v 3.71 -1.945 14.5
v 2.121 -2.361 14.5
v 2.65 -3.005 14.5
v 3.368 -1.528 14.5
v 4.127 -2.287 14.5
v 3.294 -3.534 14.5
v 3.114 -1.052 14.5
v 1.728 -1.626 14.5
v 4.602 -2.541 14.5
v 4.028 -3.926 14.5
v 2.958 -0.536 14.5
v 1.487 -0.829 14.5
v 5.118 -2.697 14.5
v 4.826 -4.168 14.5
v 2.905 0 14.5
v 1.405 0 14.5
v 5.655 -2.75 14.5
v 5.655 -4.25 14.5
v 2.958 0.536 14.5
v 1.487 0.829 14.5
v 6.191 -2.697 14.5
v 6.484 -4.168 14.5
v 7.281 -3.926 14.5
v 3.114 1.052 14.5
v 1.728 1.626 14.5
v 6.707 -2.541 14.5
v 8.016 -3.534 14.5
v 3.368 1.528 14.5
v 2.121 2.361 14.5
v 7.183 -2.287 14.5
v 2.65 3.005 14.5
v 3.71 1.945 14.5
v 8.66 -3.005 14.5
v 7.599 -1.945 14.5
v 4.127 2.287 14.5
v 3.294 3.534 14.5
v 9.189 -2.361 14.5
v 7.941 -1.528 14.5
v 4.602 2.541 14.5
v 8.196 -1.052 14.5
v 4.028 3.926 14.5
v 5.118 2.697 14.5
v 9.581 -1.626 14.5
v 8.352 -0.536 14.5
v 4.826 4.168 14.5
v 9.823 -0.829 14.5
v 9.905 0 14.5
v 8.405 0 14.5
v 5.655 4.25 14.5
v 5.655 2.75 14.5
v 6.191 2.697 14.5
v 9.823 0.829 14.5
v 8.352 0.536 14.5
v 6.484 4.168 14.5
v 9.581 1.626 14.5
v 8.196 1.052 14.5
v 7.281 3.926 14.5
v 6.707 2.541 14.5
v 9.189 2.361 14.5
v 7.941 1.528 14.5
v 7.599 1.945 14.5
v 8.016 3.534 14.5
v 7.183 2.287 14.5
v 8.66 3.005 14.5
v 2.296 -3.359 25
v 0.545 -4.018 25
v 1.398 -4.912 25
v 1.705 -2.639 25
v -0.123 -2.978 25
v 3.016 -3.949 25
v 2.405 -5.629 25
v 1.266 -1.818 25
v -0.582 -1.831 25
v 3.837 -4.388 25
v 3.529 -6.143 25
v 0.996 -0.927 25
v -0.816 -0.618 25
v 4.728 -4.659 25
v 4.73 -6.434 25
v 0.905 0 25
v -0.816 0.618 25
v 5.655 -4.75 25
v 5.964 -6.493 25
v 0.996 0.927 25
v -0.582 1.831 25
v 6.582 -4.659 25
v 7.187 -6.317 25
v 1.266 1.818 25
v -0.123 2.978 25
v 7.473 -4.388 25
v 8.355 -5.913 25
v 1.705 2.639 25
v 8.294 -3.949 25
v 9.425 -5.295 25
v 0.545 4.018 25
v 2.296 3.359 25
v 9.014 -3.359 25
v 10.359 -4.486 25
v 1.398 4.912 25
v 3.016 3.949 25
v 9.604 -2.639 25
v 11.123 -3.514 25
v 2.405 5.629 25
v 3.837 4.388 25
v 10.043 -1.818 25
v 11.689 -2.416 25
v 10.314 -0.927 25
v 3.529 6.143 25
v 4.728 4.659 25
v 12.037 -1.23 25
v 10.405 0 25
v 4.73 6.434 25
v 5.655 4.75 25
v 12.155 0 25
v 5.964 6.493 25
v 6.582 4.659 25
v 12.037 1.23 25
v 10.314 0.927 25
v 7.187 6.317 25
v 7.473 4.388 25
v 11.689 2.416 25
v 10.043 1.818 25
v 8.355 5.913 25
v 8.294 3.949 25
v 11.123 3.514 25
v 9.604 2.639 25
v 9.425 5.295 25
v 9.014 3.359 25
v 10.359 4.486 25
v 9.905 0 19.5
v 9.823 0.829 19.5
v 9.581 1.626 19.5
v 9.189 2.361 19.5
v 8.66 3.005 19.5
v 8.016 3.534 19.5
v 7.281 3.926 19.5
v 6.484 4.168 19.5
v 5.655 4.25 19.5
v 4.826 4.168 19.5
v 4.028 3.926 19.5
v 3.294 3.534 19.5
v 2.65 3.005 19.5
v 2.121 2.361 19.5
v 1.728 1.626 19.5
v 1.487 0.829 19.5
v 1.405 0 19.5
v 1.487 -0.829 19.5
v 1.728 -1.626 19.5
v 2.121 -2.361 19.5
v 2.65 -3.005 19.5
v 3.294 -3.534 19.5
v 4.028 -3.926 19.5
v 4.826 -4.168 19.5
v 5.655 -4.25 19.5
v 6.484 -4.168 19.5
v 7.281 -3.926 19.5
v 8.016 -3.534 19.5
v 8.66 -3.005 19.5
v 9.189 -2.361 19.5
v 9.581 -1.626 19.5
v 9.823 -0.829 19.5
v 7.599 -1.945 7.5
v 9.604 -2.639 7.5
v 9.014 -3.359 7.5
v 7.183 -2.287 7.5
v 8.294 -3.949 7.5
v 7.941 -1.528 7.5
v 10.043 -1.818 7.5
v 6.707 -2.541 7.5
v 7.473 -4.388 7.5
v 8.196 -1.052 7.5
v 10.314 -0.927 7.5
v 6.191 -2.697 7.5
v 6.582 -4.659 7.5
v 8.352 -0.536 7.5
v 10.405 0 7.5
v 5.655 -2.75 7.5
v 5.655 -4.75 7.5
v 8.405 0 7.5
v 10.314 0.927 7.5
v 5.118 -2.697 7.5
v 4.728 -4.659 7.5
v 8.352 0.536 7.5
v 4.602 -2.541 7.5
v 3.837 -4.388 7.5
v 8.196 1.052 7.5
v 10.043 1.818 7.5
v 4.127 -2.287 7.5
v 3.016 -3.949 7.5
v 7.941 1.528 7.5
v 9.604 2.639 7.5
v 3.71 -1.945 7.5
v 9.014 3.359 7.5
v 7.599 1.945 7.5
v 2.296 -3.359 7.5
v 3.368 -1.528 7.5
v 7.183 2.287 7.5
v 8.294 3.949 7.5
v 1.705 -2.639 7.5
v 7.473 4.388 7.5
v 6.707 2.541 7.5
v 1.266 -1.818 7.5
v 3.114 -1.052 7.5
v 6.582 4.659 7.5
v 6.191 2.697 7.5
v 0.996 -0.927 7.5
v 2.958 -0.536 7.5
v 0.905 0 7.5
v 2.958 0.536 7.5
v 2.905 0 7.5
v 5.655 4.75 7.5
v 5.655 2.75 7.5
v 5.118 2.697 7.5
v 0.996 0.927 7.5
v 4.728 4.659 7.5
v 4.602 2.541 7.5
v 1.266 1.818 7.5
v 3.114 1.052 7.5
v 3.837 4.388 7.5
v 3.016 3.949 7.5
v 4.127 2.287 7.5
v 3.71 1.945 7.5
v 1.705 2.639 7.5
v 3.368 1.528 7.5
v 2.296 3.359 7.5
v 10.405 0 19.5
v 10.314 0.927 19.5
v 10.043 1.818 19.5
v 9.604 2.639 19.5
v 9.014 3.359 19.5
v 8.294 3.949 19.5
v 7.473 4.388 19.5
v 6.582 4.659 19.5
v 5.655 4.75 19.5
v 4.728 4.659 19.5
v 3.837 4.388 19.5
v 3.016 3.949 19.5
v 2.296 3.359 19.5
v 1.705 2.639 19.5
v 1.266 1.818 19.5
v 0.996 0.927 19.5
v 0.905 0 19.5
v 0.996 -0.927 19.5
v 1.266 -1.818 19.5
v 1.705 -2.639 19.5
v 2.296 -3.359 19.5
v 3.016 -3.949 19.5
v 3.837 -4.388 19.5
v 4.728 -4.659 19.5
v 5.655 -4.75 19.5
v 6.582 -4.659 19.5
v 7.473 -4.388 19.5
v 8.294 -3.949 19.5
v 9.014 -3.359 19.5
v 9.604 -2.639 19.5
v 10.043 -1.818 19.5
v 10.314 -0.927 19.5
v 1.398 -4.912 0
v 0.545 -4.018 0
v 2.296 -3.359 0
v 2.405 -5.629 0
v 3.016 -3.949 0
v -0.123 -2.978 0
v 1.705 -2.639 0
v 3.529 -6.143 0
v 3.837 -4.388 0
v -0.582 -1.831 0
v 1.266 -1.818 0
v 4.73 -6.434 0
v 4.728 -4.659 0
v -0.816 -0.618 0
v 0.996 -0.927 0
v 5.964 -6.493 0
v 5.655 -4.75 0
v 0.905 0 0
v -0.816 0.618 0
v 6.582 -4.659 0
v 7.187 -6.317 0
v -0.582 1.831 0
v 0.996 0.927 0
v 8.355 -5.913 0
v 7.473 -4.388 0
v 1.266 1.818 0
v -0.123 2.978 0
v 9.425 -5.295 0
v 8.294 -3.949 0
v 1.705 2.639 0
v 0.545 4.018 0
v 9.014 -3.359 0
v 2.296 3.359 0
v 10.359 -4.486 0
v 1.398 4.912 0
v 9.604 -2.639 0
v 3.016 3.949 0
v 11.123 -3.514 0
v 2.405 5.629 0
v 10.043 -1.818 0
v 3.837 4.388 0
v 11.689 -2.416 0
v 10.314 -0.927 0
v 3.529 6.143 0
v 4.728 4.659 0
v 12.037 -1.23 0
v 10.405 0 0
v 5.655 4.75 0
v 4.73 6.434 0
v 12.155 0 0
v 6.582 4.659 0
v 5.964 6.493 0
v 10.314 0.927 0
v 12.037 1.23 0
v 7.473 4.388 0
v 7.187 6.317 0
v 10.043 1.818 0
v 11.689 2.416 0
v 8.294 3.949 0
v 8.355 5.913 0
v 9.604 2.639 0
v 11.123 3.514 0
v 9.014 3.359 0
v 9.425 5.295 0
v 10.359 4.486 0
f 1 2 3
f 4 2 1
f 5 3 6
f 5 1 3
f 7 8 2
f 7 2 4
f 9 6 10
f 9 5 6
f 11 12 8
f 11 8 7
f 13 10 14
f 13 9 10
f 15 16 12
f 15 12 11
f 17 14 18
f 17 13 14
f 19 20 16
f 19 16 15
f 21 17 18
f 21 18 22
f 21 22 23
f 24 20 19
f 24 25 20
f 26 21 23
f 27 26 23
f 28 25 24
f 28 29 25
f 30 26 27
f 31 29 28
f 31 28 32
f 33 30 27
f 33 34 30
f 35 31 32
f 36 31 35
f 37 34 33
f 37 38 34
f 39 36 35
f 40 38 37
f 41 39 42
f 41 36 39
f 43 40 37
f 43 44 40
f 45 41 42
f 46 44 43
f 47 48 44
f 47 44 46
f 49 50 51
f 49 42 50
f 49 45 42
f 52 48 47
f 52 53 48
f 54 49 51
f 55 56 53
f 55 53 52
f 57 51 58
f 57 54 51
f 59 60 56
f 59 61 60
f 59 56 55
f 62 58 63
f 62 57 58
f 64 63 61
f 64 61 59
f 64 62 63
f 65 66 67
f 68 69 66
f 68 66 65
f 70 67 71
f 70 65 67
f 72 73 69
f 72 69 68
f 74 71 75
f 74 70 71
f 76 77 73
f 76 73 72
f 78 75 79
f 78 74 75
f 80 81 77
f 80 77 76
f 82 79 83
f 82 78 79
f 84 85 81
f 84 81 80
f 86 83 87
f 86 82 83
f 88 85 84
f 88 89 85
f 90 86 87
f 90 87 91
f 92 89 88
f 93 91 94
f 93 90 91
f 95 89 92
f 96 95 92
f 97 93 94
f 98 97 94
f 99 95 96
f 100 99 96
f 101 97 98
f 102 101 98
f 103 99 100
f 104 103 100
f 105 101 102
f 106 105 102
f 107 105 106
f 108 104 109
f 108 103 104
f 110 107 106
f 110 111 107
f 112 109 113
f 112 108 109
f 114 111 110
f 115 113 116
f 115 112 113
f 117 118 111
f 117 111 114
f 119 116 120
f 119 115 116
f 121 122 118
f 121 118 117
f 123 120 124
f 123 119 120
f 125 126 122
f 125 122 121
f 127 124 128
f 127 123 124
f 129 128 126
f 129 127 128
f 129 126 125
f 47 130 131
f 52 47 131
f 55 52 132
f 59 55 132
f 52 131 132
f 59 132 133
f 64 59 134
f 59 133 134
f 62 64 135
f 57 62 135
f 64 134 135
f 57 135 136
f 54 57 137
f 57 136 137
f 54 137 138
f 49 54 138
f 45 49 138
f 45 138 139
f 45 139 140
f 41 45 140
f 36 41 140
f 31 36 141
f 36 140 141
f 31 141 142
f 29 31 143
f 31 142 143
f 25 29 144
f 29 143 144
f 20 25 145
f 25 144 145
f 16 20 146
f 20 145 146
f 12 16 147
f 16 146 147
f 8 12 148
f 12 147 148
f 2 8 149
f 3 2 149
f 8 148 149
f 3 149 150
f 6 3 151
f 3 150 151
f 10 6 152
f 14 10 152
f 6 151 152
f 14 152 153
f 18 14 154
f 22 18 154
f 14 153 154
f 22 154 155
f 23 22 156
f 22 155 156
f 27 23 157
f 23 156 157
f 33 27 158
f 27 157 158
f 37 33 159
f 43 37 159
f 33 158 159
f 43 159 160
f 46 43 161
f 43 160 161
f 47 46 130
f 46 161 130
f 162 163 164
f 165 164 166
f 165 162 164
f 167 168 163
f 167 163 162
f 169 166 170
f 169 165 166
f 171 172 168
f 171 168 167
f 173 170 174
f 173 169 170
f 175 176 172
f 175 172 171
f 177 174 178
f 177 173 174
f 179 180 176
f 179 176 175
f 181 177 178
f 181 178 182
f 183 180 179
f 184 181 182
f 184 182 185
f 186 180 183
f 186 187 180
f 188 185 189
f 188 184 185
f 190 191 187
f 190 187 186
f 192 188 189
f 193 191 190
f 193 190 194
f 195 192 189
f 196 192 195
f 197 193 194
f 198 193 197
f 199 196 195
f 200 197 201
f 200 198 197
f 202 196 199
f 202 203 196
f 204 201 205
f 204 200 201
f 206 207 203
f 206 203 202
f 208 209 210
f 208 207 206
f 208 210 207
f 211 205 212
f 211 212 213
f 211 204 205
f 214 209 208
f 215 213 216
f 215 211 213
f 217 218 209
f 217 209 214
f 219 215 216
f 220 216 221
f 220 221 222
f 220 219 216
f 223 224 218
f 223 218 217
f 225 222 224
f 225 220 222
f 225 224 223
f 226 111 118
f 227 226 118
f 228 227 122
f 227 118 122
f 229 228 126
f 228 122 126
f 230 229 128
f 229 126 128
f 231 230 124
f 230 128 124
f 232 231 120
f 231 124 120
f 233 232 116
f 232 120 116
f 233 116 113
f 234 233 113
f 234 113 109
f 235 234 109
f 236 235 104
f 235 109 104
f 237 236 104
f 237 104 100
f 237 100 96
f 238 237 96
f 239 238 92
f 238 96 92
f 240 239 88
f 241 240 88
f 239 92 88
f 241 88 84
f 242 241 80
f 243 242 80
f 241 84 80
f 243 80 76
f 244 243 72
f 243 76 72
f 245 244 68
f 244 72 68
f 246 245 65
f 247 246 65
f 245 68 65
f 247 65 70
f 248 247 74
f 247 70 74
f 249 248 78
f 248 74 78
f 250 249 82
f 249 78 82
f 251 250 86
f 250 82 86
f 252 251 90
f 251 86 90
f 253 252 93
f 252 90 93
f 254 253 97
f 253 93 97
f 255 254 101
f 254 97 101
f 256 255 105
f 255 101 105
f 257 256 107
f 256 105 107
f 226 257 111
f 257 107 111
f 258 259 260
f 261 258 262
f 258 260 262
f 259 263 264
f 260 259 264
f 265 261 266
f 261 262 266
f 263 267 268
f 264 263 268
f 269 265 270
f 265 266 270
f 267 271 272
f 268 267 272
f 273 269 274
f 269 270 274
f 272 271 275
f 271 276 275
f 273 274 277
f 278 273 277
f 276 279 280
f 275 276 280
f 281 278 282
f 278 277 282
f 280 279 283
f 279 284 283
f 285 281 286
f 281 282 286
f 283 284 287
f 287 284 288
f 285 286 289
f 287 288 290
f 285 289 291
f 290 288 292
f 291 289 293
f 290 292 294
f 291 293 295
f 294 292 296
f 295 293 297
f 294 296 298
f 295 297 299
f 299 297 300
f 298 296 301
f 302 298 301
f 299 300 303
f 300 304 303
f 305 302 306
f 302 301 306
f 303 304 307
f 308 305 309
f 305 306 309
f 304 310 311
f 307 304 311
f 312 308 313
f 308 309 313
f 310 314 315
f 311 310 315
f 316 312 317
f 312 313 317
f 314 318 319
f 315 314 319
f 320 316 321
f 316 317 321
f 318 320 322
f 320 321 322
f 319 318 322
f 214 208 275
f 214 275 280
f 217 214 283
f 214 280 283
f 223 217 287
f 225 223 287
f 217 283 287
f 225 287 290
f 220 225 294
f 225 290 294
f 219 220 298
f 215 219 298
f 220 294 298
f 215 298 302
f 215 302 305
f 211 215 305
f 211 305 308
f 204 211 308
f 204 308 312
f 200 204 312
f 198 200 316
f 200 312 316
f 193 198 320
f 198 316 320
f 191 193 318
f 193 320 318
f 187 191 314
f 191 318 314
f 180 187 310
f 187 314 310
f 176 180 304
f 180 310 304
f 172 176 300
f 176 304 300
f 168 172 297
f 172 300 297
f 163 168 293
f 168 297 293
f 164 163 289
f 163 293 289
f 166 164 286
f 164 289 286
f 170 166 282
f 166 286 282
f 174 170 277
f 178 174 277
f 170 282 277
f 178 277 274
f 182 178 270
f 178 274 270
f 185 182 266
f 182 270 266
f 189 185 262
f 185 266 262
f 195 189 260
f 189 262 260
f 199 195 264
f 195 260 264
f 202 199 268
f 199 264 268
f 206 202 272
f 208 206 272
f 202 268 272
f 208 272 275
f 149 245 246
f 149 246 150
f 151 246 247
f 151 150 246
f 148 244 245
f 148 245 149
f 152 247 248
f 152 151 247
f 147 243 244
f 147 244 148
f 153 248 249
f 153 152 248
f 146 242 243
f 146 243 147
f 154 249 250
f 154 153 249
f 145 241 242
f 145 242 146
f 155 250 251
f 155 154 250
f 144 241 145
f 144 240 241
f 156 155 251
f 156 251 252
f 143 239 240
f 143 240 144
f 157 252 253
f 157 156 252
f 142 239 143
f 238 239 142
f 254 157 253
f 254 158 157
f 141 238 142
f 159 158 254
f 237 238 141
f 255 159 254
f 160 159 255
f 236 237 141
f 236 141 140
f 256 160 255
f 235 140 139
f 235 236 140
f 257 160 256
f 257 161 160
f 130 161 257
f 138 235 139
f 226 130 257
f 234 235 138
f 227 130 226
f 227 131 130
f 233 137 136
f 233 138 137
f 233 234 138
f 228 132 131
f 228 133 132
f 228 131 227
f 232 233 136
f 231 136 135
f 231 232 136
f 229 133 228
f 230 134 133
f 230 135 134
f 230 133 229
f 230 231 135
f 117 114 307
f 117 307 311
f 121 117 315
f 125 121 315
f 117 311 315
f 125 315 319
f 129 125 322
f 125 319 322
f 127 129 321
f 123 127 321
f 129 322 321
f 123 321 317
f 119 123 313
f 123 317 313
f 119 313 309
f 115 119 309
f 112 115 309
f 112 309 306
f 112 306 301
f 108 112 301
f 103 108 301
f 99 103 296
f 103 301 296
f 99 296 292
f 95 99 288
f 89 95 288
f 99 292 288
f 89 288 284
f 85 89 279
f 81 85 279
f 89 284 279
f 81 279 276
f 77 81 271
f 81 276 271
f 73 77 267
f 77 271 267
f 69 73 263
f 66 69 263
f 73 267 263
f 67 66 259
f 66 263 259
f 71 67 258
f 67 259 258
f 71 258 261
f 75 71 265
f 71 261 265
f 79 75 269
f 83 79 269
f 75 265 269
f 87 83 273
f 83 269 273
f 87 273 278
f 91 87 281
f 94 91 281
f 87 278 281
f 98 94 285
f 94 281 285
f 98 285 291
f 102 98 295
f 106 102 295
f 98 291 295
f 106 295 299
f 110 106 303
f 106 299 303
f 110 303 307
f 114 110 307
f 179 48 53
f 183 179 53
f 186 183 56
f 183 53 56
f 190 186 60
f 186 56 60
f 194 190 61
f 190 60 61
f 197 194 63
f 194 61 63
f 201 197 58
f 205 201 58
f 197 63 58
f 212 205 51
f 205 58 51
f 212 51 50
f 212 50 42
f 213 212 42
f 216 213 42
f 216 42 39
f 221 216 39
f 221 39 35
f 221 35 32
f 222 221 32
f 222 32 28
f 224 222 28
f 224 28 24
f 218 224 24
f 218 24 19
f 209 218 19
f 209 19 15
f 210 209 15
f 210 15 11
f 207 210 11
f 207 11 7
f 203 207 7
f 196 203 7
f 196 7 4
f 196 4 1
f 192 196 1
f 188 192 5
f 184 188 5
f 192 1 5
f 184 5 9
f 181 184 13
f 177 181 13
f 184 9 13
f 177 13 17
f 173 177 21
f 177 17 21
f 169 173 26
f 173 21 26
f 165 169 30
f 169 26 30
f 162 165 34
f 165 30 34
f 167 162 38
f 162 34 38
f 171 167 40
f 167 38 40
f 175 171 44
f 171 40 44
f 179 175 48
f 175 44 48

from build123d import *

# Parameters (mm, degrees)
SKETCH2_R           = 6.5
BOSS_EXTRUDE1_DEPTH = 25
SKETCH3_R           = 4.75
CUT_EXTRUDE1_DEPTH  = 5.5
SKETCH4_R           = 4.25
CUT_EXTRUDE2_DEPTH  = 5
SKETCH6_R           = 4.75
CUT_EXTRUDE3_DEPTH  = 7.5
CUT_EXTRUDE4_REACH  = 16.5
SKETCH7_R           = 2.75


with BuildPart() as part:
    # Sketch2 → Boss-Extrude1 (new body)
    with BuildSketch(Plane.XY):
        with Locations((5.654843538, 0)):
            Circle(SKETCH2_R)
    extrude(amount=BOSS_EXTRUDE1_DEPTH)

    # Sketch3 → Cut-Extrude1 (cut)
    with BuildSketch(Plane.XY.offset(25)):
        with Locations((5.654843538, 0)):
            Circle(SKETCH3_R)
    extrude(amount=-CUT_EXTRUDE1_DEPTH, mode=Mode.SUBTRACT)

    # Sketch4 → Cut-Extrude2 (cut)
    with BuildSketch(Plane.XY.offset(19.5)):
        with Locations((5.654843538, 0)):
            Circle(SKETCH4_R)
    extrude(amount=-CUT_EXTRUDE2_DEPTH, mode=Mode.SUBTRACT)

    # Sketch6 → Cut-Extrude3 (cut)
    with BuildSketch(Plane(origin=(0, 0, 0), x_dir=(-1, 0, 0), z_dir=(0, 0, -1))):
        with Locations((-5.654843538, 0)):
            Circle(SKETCH6_R)
    extrude(amount=-CUT_EXTRUDE3_DEPTH, mode=Mode.SUBTRACT)

    # Sketch7 → Cut-Extrude4 (cut, up to next)
    with BuildSketch(Plane.XY.offset(14.5), mode=Mode.PRIVATE) as cut_extrude4_sk1:
        with Locations((5.654843538, 0)):
            Circle(SKETCH7_R)
    cut_extrude4_tool1 = extrude(cut_extrude4_sk1.sketch, amount=-CUT_EXTRUDE4_REACH, mode=Mode.PRIVATE) & part.part
    add(cut_extrude4_tool1.solids().sort_by_distance((5.654844, 0, 14.5))[0], mode=Mode.SUBTRACT)


solid = part.part
